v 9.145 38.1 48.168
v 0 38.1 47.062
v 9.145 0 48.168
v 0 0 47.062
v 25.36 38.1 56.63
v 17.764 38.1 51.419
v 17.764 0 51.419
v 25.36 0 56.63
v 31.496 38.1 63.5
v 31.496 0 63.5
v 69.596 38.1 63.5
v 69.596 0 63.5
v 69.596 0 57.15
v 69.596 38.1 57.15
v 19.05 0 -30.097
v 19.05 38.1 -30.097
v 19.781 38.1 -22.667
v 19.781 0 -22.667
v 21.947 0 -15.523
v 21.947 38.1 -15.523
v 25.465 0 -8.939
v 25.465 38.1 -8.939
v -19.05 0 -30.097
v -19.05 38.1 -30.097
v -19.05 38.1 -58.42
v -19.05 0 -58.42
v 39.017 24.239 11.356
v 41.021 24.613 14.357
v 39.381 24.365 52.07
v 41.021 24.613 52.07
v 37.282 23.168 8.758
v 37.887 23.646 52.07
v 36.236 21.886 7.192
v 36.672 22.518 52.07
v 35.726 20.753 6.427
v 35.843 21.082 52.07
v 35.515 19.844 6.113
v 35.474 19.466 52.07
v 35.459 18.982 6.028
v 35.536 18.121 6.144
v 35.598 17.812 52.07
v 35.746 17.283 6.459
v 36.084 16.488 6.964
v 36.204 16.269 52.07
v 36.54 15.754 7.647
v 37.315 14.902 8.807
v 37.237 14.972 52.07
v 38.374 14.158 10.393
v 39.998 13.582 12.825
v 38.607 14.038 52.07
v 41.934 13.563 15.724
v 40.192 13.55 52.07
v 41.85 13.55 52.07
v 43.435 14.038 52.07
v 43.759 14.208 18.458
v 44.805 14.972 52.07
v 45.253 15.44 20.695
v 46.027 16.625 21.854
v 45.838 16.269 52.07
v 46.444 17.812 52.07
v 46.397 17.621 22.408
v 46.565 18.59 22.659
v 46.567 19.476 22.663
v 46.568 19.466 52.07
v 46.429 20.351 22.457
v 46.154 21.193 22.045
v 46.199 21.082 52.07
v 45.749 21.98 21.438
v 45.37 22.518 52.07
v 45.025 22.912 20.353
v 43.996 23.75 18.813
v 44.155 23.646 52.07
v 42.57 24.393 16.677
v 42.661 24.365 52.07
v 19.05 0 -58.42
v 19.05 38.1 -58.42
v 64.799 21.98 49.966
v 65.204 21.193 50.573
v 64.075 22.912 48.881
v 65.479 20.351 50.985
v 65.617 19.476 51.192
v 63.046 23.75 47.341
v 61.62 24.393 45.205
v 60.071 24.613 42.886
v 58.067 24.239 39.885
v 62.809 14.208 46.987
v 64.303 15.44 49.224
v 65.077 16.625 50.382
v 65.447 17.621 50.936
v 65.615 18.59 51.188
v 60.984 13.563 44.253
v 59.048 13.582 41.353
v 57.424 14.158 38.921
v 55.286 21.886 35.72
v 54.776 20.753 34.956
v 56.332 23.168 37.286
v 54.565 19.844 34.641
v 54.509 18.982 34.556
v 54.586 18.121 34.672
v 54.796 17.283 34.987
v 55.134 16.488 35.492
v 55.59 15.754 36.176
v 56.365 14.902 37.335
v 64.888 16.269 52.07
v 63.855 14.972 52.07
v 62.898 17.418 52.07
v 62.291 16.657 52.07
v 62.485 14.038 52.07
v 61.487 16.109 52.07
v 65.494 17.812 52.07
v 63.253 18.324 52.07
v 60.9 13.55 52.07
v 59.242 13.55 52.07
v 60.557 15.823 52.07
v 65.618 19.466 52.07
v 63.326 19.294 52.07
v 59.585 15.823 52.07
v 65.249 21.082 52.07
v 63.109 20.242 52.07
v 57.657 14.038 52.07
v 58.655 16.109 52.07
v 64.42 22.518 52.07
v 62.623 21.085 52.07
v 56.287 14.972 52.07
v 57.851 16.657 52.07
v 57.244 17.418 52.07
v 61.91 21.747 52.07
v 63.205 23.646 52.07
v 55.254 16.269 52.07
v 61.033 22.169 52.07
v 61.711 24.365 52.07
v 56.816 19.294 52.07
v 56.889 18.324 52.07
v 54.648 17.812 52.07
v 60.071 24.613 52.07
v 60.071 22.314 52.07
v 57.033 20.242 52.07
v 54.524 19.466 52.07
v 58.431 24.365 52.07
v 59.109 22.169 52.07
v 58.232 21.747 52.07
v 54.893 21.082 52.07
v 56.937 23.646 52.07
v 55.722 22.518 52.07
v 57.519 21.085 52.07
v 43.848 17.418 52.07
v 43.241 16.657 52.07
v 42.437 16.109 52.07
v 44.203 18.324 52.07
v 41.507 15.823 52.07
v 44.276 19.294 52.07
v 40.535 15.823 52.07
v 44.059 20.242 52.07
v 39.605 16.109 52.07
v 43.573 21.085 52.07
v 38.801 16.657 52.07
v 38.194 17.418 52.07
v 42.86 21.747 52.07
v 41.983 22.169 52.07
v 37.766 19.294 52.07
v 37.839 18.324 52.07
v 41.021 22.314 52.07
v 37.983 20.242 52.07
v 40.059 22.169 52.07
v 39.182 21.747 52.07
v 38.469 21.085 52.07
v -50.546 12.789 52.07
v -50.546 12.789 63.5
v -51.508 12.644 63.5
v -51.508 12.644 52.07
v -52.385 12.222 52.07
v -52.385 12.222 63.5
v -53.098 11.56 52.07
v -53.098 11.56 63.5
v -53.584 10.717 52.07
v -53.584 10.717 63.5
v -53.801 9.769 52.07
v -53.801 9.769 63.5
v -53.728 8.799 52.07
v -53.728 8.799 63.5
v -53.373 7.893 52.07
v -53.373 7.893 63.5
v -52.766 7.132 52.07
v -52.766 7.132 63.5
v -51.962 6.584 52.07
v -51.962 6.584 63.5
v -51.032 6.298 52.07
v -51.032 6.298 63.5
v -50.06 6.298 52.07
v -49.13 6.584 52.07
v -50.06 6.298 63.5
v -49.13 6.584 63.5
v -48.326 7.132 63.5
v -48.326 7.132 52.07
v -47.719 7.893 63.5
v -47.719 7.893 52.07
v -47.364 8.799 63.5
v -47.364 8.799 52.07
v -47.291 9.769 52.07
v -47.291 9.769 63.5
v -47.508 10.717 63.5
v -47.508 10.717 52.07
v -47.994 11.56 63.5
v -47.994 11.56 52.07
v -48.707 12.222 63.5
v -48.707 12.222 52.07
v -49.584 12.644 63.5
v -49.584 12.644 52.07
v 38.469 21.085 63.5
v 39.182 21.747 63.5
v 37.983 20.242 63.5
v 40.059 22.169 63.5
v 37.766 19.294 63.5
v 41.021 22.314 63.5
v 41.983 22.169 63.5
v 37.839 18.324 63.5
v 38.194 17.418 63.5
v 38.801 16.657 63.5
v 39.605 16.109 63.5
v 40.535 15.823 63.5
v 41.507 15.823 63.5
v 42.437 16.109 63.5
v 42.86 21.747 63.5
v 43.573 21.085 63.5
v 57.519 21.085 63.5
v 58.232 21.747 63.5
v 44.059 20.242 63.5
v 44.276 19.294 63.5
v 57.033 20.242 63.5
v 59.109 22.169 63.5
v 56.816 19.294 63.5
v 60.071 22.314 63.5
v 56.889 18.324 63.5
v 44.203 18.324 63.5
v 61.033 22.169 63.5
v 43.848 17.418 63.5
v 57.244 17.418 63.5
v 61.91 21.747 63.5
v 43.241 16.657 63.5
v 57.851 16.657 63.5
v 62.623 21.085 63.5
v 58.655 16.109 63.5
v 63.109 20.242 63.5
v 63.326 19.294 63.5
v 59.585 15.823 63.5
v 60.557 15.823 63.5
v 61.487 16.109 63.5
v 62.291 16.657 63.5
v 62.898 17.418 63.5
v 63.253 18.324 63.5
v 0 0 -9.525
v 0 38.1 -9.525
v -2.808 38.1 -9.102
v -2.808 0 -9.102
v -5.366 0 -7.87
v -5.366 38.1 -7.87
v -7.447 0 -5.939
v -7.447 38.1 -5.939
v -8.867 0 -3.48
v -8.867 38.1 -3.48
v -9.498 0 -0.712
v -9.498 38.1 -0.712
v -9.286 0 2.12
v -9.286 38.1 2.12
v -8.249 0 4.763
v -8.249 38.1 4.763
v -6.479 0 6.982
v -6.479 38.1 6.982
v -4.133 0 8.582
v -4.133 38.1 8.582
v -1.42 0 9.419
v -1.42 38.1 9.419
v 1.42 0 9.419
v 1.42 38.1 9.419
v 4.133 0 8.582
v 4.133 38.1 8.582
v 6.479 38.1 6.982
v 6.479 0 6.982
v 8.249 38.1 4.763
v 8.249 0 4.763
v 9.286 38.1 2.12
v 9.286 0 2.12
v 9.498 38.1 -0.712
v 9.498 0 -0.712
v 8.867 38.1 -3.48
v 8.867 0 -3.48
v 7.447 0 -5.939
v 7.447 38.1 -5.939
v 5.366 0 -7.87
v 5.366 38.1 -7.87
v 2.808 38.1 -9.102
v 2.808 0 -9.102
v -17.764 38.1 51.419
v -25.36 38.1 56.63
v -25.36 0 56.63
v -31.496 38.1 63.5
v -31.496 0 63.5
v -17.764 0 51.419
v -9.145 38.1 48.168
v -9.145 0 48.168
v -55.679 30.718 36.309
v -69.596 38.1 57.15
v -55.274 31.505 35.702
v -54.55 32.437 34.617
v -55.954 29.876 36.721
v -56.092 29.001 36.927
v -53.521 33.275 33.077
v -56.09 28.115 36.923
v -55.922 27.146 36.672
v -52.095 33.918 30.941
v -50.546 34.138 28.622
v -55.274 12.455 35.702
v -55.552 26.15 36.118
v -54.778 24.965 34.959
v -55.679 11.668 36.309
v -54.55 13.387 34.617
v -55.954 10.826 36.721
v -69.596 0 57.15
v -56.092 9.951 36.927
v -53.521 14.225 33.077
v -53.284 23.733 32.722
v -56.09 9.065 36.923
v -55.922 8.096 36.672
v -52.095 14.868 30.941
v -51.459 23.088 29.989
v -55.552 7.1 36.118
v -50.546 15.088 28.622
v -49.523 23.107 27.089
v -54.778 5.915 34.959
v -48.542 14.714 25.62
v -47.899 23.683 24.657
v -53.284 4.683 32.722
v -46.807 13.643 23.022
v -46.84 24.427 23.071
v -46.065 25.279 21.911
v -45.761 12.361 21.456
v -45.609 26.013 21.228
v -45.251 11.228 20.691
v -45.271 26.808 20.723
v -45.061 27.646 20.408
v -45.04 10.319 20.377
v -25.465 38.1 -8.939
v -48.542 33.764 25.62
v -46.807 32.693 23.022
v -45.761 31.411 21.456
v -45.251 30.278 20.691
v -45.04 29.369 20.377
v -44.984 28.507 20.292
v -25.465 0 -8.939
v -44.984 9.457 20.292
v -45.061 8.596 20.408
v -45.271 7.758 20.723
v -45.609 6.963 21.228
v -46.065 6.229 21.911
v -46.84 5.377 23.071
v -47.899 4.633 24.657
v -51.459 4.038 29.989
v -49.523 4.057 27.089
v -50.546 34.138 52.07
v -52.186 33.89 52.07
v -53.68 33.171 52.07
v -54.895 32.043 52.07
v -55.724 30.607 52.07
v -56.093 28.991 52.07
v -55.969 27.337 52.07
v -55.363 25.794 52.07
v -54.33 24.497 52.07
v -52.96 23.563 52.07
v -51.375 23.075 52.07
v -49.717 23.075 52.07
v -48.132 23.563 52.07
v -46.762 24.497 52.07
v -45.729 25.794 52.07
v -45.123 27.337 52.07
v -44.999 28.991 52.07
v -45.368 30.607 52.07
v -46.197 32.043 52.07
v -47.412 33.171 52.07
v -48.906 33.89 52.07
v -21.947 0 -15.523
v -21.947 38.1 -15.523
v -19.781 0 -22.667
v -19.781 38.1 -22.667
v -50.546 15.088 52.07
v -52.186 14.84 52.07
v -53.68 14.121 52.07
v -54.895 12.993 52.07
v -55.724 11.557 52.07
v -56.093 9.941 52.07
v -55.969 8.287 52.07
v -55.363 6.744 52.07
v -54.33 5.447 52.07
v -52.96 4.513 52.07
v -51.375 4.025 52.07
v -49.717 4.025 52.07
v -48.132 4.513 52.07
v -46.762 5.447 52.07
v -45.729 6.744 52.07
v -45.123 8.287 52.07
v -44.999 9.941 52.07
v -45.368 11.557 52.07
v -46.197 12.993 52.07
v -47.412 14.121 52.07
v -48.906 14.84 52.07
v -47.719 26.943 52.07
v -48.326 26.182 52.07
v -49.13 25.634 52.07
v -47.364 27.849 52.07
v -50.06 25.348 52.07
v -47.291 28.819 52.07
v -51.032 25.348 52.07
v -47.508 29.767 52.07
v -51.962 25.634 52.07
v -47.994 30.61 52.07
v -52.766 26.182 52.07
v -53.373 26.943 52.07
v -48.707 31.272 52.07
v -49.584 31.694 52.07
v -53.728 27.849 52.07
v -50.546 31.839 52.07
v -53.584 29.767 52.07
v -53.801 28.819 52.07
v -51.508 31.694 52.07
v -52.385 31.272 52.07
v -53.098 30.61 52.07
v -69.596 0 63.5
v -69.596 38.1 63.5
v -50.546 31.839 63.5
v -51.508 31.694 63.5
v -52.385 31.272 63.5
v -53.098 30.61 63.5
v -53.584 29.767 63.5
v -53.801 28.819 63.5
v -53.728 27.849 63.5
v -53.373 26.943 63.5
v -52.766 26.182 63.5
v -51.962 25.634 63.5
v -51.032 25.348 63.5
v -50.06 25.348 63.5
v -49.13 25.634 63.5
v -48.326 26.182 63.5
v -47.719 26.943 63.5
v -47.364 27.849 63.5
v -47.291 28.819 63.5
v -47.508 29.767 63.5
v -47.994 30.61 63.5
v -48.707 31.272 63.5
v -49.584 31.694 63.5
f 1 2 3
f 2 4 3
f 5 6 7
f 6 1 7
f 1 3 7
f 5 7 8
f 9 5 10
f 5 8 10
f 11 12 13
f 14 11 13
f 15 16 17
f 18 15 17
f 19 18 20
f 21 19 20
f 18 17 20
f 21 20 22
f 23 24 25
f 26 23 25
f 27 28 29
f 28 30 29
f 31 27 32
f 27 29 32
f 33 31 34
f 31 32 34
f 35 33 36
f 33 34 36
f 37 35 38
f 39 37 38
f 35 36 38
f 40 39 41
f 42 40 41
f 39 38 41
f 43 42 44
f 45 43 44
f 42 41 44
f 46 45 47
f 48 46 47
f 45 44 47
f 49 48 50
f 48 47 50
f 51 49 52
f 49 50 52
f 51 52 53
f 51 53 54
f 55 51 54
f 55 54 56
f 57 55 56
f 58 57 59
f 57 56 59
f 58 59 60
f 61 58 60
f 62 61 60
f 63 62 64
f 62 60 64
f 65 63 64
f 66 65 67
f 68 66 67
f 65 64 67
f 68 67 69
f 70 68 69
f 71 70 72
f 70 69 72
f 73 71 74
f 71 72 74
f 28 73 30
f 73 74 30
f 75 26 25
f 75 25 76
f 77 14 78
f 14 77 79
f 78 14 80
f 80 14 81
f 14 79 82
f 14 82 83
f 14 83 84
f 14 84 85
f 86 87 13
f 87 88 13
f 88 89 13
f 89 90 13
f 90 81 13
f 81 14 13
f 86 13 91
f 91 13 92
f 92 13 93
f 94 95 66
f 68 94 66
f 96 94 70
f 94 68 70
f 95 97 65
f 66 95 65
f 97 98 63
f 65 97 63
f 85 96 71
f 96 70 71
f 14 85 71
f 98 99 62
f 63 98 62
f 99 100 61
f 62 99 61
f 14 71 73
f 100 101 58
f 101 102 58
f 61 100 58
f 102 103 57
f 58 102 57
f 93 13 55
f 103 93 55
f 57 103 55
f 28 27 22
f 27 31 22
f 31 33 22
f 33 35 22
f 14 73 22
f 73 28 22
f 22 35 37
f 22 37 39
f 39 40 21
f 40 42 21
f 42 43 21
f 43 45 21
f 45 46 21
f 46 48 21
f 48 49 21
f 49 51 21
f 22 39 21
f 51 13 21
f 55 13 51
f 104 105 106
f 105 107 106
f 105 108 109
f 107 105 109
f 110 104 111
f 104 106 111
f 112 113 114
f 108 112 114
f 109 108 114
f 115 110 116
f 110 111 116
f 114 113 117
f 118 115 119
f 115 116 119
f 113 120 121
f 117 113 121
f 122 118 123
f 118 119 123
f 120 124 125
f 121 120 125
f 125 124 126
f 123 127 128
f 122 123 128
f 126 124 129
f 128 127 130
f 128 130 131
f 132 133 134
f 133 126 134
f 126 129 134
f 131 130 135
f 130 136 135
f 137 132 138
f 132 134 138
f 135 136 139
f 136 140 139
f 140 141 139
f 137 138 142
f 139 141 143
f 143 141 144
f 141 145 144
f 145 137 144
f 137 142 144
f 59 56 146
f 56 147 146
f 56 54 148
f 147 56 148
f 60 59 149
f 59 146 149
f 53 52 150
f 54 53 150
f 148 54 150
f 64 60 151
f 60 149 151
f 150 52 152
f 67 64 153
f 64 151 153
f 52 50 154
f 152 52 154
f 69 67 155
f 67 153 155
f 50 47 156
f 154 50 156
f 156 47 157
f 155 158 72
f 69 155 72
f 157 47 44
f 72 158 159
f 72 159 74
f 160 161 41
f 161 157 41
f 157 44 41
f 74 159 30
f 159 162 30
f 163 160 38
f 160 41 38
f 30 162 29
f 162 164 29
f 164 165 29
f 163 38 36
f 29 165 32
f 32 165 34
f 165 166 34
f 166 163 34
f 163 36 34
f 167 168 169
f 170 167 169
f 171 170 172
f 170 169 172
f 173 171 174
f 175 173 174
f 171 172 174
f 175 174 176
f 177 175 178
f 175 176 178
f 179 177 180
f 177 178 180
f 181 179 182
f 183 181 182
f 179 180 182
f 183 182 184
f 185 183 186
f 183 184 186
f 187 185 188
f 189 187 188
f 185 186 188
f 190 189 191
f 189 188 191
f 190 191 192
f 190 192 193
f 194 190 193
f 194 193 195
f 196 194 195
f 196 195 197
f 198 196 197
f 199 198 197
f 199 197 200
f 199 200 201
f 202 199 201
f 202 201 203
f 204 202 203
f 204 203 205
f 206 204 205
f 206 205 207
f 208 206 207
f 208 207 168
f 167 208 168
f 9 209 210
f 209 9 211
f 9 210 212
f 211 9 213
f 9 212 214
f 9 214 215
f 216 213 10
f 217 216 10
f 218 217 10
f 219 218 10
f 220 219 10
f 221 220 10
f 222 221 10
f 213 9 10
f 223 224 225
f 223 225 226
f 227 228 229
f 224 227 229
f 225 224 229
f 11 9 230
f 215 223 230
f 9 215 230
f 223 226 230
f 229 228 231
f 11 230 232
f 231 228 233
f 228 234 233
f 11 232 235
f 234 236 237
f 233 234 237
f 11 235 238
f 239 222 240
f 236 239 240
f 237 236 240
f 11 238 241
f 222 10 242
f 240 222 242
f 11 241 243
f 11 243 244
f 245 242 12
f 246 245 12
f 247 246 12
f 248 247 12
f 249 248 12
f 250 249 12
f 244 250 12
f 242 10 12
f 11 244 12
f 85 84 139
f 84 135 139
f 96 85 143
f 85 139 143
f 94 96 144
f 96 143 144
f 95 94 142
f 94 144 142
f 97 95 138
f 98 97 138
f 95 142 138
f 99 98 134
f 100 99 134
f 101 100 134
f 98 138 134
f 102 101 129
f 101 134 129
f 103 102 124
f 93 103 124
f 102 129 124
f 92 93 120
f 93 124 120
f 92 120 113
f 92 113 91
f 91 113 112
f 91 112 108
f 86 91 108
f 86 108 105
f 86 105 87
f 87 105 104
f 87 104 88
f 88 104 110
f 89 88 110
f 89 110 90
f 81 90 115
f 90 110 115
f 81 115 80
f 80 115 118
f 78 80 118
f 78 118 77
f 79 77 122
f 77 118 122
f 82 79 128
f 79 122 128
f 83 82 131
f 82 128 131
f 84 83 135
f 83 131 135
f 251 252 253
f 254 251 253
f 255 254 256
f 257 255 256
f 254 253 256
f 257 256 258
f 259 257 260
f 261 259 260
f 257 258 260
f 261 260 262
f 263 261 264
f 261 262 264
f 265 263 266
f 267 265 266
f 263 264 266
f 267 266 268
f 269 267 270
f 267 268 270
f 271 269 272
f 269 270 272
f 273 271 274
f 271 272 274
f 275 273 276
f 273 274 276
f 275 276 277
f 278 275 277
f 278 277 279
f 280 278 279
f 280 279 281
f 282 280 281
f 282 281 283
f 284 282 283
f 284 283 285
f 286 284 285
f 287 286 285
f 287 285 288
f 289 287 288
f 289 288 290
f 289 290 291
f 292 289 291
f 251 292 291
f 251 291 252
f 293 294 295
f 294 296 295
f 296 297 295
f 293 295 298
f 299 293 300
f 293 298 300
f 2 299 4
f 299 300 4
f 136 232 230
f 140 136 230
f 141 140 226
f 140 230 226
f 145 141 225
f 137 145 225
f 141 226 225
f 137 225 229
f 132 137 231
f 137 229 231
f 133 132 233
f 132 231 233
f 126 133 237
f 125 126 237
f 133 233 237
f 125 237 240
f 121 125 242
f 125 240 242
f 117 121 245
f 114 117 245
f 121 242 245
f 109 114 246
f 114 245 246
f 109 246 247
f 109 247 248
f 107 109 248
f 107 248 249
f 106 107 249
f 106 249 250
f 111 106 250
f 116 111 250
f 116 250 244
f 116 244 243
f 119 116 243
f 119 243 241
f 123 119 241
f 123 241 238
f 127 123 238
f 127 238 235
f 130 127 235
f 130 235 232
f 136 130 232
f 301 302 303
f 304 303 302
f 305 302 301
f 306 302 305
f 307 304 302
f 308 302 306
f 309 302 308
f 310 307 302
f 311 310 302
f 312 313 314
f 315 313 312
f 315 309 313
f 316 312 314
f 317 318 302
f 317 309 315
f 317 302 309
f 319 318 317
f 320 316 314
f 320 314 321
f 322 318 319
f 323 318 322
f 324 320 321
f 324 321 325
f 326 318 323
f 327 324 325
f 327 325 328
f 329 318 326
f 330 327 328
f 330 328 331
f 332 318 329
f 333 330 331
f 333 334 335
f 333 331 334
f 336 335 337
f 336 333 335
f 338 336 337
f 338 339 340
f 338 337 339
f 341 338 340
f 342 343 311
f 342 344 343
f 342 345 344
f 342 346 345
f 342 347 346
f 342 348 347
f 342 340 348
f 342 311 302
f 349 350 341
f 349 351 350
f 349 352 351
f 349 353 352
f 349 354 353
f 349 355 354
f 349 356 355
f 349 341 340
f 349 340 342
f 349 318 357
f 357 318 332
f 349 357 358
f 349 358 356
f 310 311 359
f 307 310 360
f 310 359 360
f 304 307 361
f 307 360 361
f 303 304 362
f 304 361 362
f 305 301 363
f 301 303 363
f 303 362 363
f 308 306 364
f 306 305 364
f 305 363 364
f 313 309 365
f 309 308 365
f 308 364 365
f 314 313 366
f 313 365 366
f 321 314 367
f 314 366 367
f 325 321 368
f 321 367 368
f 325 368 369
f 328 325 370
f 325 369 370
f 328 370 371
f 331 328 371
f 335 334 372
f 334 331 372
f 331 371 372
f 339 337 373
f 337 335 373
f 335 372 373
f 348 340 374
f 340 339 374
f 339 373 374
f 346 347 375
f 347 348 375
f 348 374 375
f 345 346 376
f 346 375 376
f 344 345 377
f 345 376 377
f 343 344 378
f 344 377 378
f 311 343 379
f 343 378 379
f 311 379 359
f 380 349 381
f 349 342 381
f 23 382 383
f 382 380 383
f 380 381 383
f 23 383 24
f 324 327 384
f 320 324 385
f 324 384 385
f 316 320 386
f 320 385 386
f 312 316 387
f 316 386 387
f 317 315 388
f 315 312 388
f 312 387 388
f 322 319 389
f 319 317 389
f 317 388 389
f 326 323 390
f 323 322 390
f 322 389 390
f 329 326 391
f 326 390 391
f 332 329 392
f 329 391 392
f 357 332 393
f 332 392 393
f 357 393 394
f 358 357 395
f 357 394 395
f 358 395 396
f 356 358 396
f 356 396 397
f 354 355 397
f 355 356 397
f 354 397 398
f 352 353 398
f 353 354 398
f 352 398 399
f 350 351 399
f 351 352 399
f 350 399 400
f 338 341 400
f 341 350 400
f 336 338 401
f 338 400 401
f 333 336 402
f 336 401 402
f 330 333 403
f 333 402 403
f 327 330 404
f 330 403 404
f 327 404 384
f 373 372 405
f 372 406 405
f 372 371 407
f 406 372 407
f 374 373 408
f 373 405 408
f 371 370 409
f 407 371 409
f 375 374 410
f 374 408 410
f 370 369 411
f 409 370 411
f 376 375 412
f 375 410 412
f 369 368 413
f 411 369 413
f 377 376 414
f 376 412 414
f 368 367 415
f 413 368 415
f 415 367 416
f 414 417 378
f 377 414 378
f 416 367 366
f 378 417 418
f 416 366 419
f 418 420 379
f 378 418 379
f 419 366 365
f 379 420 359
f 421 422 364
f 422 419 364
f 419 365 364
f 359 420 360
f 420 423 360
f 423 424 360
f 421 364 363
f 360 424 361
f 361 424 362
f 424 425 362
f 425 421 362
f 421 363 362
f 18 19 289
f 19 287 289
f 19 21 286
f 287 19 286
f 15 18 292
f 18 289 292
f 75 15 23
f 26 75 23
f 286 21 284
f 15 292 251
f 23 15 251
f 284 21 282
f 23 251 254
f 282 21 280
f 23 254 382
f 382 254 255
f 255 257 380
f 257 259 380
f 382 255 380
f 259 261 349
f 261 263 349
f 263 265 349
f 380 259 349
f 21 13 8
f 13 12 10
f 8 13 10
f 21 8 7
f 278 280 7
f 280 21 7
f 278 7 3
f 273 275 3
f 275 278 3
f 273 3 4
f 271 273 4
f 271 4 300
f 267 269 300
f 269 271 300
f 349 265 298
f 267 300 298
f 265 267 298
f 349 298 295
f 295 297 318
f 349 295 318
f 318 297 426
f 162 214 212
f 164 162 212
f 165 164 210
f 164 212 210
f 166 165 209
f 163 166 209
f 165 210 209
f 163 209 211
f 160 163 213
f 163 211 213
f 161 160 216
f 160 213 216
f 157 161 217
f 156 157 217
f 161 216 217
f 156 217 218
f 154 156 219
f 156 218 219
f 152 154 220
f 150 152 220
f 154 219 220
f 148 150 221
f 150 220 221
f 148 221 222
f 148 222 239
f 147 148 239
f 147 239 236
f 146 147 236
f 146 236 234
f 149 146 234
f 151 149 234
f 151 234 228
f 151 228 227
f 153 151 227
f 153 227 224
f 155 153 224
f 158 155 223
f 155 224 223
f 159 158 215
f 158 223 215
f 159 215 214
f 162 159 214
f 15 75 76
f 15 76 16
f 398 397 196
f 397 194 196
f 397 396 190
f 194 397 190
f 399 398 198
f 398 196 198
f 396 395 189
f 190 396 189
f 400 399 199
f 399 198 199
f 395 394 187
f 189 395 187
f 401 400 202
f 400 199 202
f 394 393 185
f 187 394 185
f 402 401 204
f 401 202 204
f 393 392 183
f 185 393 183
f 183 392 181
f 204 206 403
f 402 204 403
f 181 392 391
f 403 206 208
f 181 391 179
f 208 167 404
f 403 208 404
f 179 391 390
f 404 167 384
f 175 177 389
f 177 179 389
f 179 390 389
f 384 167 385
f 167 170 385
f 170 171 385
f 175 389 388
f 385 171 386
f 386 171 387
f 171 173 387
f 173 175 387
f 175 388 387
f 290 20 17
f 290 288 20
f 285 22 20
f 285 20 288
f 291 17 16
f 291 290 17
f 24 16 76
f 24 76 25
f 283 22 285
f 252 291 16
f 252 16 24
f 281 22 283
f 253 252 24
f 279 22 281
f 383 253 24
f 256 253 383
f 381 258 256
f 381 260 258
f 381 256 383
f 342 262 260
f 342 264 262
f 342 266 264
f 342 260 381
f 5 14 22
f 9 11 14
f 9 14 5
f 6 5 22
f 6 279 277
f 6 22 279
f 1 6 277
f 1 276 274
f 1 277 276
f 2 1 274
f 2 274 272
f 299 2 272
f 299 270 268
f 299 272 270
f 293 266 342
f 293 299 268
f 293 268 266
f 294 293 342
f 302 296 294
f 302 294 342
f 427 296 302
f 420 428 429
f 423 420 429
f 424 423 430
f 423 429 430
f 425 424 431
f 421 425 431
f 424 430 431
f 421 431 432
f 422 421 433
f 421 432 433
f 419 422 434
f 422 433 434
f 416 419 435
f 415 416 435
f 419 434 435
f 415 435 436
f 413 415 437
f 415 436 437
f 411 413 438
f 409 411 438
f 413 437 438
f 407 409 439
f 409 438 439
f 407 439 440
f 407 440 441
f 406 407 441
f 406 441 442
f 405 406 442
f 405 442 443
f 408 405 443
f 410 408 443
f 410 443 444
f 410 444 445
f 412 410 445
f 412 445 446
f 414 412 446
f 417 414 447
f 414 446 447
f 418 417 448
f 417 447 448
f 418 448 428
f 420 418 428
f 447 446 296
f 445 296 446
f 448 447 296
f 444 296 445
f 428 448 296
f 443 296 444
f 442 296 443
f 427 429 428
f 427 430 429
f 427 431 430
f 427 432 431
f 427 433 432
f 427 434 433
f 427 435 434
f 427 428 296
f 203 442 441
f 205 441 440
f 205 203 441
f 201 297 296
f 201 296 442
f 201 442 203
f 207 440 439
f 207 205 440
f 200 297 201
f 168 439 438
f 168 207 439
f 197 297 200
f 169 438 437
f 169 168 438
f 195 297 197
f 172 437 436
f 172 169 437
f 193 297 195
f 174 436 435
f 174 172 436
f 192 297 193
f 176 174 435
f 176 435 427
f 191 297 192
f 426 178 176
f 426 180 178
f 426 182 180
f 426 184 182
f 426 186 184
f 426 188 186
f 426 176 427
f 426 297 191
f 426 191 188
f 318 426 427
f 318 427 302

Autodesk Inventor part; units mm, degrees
ref_plane "YZ Plane" through (0, 0, 0) normal (1, 0, 0) x (0, 1, 0)
ref_plane "XZ Plane" through (0, 0, 0) normal (0, 1, 0) x (-1, 0, 0)
ref_plane "XY Plane" through (0, 0, 0) normal (0, 0, 1) x (1, 0, 0)
sketch "Sketch1" plane through (0, 0, 0) normal (0, 1, 0) x (-1, 0, 0)
  line L0 (19.05, -18.5452) -> (19.05, -58.42)
  line L1 (19.05, -58.42) -> (0, -58.42)
  line L2 (19.05, -58.42) -> (19.05, -18.5452)
  line L3 (31.496, 63.5) -> (69.596, 63.5)
  arc A0 (0, 47.0625) -> (31.496, 63.5) centre (0, 85.4562) ccw
  line L4 (0, 85.4562) -> (0, -58.42) construction
  line L5 (69.596, 63.5) -> (69.596, 57.15)
  line L6 (69.596, 57.15) -> (19.05, -18.5452)
  line L7 (0, 0) -> (69.596, 0) construction
  line L8 (-19.05, -58.42) -> (0, -58.42)
  line L9 (-19.05, -58.42) -> (-19.05, -18.5452)
  line L10 (-31.496, 63.5) -> (-69.596, 63.5)
  arc A1 (-31.496, 63.5) -> (0, 47.0625) centre (0, 85.4562) ccw
  line L11 (-69.596, 63.5) -> (-69.596, 57.15)
  line L12 (-69.596, 57.15) -> (-19.05, -18.5452)
  dimension "d73" = 38.3937
  dimension "d74" = 57.15
  dimension "d75" = 18.5452
  dimension "d76" = 19.05
  dimension "d77" = 58.42
  dimension "d78" = 69.596
  dimension "d79" = 38.1
  dimension "d80" = 31.496
  dimension "d81" = 63.5
  dimension "d82" = 6.35
  dimension "d83" = 39.8748
  dimension "d84" = 47.0626
  dimension "d86" = 121.92
  dimension "d90" = 38.1
extrude "Extrusion1" add sketch "Sketch1" along normal blind 38.1
hole "Hole1" at (0, 0, 0) direction (0, 1, 0) diameter 19.05 end through all
sketch "Sketch2" plane through (19.05, 0, -58.42) normal (0, 0, -1) x (-1, 0, 0)
  line L0 (38.1, 0) -> (88.646, 0) projected
  line L1 (88.646, 0) -> (88.646, 38.1) projected
  line L2 (38.1, 38.1) -> (88.646, 38.1) projected
  line L3 (38.1, 0) -> (38.1, 38.1) projected
  line L4 (-50.546, 0) -> (0, 0) projected
  line L5 (0, 0) -> (0, 38.1) projected
  line L6 (-50.546, 38.1) -> (0, 38.1) projected
  line L7 (-50.546, 0) -> (-50.546, 38.1) projected
  line L8 (88.646, 0) -> (50.546, 0) projected
  line L9 (50.546, 0) -> (50.546, 38.1) projected
  line L10 (88.646, 38.1) -> (50.546, 38.1) projected
  line L11 (88.646, 0) -> (88.646, 38.1) projected
  line L12 (69.596, 38.1) -> (69.596, 0) construction
  line L13 (-12.446, 0) -> (-12.446, 38.1) construction
  line L14 (-50.546, 19.05) -> (-12.446, 19.05) construction
  point P0 (19.05, 0)
  point P1 (-41.021, 19.05)
  point P2 (-21.971, 19.05)
  point P3 (69.596, 28.575)
  point P4 (69.596, 9.525)
  dimension "d92" = 38.1
  dimension "d93" = 9.525
  dimension "d94" = 9.525
  dimension "d95" = 9.525
  dimension "d96" = 9.525
  dimension "d97" = 38.1
hole "Hole2" at (60.071, 19.05, -58.42) at (41.021, 19.05, -58.42) at (-50.546, 28.575, -58.42) at (-50.546, 9.525, -58.42) direction (0, 0, 1) diameter 6.5278 depth 121.92 counterbore diameter 11.1252 counterbore depth 110.49 clearance for "Socket Head Cap Screw" size "1/4" standard "Ansi Unified Screw Threads"
fillet "Fillet1" radius 38.1 2 edges at (19.05, 19.05, -18.5452) (-19.05, 19.05, -18.5452)
equation "\"d94\" = d93"
equation "\"d95\" = d93"
equation "\"d96\" = d95"
properties part number "front leg"
